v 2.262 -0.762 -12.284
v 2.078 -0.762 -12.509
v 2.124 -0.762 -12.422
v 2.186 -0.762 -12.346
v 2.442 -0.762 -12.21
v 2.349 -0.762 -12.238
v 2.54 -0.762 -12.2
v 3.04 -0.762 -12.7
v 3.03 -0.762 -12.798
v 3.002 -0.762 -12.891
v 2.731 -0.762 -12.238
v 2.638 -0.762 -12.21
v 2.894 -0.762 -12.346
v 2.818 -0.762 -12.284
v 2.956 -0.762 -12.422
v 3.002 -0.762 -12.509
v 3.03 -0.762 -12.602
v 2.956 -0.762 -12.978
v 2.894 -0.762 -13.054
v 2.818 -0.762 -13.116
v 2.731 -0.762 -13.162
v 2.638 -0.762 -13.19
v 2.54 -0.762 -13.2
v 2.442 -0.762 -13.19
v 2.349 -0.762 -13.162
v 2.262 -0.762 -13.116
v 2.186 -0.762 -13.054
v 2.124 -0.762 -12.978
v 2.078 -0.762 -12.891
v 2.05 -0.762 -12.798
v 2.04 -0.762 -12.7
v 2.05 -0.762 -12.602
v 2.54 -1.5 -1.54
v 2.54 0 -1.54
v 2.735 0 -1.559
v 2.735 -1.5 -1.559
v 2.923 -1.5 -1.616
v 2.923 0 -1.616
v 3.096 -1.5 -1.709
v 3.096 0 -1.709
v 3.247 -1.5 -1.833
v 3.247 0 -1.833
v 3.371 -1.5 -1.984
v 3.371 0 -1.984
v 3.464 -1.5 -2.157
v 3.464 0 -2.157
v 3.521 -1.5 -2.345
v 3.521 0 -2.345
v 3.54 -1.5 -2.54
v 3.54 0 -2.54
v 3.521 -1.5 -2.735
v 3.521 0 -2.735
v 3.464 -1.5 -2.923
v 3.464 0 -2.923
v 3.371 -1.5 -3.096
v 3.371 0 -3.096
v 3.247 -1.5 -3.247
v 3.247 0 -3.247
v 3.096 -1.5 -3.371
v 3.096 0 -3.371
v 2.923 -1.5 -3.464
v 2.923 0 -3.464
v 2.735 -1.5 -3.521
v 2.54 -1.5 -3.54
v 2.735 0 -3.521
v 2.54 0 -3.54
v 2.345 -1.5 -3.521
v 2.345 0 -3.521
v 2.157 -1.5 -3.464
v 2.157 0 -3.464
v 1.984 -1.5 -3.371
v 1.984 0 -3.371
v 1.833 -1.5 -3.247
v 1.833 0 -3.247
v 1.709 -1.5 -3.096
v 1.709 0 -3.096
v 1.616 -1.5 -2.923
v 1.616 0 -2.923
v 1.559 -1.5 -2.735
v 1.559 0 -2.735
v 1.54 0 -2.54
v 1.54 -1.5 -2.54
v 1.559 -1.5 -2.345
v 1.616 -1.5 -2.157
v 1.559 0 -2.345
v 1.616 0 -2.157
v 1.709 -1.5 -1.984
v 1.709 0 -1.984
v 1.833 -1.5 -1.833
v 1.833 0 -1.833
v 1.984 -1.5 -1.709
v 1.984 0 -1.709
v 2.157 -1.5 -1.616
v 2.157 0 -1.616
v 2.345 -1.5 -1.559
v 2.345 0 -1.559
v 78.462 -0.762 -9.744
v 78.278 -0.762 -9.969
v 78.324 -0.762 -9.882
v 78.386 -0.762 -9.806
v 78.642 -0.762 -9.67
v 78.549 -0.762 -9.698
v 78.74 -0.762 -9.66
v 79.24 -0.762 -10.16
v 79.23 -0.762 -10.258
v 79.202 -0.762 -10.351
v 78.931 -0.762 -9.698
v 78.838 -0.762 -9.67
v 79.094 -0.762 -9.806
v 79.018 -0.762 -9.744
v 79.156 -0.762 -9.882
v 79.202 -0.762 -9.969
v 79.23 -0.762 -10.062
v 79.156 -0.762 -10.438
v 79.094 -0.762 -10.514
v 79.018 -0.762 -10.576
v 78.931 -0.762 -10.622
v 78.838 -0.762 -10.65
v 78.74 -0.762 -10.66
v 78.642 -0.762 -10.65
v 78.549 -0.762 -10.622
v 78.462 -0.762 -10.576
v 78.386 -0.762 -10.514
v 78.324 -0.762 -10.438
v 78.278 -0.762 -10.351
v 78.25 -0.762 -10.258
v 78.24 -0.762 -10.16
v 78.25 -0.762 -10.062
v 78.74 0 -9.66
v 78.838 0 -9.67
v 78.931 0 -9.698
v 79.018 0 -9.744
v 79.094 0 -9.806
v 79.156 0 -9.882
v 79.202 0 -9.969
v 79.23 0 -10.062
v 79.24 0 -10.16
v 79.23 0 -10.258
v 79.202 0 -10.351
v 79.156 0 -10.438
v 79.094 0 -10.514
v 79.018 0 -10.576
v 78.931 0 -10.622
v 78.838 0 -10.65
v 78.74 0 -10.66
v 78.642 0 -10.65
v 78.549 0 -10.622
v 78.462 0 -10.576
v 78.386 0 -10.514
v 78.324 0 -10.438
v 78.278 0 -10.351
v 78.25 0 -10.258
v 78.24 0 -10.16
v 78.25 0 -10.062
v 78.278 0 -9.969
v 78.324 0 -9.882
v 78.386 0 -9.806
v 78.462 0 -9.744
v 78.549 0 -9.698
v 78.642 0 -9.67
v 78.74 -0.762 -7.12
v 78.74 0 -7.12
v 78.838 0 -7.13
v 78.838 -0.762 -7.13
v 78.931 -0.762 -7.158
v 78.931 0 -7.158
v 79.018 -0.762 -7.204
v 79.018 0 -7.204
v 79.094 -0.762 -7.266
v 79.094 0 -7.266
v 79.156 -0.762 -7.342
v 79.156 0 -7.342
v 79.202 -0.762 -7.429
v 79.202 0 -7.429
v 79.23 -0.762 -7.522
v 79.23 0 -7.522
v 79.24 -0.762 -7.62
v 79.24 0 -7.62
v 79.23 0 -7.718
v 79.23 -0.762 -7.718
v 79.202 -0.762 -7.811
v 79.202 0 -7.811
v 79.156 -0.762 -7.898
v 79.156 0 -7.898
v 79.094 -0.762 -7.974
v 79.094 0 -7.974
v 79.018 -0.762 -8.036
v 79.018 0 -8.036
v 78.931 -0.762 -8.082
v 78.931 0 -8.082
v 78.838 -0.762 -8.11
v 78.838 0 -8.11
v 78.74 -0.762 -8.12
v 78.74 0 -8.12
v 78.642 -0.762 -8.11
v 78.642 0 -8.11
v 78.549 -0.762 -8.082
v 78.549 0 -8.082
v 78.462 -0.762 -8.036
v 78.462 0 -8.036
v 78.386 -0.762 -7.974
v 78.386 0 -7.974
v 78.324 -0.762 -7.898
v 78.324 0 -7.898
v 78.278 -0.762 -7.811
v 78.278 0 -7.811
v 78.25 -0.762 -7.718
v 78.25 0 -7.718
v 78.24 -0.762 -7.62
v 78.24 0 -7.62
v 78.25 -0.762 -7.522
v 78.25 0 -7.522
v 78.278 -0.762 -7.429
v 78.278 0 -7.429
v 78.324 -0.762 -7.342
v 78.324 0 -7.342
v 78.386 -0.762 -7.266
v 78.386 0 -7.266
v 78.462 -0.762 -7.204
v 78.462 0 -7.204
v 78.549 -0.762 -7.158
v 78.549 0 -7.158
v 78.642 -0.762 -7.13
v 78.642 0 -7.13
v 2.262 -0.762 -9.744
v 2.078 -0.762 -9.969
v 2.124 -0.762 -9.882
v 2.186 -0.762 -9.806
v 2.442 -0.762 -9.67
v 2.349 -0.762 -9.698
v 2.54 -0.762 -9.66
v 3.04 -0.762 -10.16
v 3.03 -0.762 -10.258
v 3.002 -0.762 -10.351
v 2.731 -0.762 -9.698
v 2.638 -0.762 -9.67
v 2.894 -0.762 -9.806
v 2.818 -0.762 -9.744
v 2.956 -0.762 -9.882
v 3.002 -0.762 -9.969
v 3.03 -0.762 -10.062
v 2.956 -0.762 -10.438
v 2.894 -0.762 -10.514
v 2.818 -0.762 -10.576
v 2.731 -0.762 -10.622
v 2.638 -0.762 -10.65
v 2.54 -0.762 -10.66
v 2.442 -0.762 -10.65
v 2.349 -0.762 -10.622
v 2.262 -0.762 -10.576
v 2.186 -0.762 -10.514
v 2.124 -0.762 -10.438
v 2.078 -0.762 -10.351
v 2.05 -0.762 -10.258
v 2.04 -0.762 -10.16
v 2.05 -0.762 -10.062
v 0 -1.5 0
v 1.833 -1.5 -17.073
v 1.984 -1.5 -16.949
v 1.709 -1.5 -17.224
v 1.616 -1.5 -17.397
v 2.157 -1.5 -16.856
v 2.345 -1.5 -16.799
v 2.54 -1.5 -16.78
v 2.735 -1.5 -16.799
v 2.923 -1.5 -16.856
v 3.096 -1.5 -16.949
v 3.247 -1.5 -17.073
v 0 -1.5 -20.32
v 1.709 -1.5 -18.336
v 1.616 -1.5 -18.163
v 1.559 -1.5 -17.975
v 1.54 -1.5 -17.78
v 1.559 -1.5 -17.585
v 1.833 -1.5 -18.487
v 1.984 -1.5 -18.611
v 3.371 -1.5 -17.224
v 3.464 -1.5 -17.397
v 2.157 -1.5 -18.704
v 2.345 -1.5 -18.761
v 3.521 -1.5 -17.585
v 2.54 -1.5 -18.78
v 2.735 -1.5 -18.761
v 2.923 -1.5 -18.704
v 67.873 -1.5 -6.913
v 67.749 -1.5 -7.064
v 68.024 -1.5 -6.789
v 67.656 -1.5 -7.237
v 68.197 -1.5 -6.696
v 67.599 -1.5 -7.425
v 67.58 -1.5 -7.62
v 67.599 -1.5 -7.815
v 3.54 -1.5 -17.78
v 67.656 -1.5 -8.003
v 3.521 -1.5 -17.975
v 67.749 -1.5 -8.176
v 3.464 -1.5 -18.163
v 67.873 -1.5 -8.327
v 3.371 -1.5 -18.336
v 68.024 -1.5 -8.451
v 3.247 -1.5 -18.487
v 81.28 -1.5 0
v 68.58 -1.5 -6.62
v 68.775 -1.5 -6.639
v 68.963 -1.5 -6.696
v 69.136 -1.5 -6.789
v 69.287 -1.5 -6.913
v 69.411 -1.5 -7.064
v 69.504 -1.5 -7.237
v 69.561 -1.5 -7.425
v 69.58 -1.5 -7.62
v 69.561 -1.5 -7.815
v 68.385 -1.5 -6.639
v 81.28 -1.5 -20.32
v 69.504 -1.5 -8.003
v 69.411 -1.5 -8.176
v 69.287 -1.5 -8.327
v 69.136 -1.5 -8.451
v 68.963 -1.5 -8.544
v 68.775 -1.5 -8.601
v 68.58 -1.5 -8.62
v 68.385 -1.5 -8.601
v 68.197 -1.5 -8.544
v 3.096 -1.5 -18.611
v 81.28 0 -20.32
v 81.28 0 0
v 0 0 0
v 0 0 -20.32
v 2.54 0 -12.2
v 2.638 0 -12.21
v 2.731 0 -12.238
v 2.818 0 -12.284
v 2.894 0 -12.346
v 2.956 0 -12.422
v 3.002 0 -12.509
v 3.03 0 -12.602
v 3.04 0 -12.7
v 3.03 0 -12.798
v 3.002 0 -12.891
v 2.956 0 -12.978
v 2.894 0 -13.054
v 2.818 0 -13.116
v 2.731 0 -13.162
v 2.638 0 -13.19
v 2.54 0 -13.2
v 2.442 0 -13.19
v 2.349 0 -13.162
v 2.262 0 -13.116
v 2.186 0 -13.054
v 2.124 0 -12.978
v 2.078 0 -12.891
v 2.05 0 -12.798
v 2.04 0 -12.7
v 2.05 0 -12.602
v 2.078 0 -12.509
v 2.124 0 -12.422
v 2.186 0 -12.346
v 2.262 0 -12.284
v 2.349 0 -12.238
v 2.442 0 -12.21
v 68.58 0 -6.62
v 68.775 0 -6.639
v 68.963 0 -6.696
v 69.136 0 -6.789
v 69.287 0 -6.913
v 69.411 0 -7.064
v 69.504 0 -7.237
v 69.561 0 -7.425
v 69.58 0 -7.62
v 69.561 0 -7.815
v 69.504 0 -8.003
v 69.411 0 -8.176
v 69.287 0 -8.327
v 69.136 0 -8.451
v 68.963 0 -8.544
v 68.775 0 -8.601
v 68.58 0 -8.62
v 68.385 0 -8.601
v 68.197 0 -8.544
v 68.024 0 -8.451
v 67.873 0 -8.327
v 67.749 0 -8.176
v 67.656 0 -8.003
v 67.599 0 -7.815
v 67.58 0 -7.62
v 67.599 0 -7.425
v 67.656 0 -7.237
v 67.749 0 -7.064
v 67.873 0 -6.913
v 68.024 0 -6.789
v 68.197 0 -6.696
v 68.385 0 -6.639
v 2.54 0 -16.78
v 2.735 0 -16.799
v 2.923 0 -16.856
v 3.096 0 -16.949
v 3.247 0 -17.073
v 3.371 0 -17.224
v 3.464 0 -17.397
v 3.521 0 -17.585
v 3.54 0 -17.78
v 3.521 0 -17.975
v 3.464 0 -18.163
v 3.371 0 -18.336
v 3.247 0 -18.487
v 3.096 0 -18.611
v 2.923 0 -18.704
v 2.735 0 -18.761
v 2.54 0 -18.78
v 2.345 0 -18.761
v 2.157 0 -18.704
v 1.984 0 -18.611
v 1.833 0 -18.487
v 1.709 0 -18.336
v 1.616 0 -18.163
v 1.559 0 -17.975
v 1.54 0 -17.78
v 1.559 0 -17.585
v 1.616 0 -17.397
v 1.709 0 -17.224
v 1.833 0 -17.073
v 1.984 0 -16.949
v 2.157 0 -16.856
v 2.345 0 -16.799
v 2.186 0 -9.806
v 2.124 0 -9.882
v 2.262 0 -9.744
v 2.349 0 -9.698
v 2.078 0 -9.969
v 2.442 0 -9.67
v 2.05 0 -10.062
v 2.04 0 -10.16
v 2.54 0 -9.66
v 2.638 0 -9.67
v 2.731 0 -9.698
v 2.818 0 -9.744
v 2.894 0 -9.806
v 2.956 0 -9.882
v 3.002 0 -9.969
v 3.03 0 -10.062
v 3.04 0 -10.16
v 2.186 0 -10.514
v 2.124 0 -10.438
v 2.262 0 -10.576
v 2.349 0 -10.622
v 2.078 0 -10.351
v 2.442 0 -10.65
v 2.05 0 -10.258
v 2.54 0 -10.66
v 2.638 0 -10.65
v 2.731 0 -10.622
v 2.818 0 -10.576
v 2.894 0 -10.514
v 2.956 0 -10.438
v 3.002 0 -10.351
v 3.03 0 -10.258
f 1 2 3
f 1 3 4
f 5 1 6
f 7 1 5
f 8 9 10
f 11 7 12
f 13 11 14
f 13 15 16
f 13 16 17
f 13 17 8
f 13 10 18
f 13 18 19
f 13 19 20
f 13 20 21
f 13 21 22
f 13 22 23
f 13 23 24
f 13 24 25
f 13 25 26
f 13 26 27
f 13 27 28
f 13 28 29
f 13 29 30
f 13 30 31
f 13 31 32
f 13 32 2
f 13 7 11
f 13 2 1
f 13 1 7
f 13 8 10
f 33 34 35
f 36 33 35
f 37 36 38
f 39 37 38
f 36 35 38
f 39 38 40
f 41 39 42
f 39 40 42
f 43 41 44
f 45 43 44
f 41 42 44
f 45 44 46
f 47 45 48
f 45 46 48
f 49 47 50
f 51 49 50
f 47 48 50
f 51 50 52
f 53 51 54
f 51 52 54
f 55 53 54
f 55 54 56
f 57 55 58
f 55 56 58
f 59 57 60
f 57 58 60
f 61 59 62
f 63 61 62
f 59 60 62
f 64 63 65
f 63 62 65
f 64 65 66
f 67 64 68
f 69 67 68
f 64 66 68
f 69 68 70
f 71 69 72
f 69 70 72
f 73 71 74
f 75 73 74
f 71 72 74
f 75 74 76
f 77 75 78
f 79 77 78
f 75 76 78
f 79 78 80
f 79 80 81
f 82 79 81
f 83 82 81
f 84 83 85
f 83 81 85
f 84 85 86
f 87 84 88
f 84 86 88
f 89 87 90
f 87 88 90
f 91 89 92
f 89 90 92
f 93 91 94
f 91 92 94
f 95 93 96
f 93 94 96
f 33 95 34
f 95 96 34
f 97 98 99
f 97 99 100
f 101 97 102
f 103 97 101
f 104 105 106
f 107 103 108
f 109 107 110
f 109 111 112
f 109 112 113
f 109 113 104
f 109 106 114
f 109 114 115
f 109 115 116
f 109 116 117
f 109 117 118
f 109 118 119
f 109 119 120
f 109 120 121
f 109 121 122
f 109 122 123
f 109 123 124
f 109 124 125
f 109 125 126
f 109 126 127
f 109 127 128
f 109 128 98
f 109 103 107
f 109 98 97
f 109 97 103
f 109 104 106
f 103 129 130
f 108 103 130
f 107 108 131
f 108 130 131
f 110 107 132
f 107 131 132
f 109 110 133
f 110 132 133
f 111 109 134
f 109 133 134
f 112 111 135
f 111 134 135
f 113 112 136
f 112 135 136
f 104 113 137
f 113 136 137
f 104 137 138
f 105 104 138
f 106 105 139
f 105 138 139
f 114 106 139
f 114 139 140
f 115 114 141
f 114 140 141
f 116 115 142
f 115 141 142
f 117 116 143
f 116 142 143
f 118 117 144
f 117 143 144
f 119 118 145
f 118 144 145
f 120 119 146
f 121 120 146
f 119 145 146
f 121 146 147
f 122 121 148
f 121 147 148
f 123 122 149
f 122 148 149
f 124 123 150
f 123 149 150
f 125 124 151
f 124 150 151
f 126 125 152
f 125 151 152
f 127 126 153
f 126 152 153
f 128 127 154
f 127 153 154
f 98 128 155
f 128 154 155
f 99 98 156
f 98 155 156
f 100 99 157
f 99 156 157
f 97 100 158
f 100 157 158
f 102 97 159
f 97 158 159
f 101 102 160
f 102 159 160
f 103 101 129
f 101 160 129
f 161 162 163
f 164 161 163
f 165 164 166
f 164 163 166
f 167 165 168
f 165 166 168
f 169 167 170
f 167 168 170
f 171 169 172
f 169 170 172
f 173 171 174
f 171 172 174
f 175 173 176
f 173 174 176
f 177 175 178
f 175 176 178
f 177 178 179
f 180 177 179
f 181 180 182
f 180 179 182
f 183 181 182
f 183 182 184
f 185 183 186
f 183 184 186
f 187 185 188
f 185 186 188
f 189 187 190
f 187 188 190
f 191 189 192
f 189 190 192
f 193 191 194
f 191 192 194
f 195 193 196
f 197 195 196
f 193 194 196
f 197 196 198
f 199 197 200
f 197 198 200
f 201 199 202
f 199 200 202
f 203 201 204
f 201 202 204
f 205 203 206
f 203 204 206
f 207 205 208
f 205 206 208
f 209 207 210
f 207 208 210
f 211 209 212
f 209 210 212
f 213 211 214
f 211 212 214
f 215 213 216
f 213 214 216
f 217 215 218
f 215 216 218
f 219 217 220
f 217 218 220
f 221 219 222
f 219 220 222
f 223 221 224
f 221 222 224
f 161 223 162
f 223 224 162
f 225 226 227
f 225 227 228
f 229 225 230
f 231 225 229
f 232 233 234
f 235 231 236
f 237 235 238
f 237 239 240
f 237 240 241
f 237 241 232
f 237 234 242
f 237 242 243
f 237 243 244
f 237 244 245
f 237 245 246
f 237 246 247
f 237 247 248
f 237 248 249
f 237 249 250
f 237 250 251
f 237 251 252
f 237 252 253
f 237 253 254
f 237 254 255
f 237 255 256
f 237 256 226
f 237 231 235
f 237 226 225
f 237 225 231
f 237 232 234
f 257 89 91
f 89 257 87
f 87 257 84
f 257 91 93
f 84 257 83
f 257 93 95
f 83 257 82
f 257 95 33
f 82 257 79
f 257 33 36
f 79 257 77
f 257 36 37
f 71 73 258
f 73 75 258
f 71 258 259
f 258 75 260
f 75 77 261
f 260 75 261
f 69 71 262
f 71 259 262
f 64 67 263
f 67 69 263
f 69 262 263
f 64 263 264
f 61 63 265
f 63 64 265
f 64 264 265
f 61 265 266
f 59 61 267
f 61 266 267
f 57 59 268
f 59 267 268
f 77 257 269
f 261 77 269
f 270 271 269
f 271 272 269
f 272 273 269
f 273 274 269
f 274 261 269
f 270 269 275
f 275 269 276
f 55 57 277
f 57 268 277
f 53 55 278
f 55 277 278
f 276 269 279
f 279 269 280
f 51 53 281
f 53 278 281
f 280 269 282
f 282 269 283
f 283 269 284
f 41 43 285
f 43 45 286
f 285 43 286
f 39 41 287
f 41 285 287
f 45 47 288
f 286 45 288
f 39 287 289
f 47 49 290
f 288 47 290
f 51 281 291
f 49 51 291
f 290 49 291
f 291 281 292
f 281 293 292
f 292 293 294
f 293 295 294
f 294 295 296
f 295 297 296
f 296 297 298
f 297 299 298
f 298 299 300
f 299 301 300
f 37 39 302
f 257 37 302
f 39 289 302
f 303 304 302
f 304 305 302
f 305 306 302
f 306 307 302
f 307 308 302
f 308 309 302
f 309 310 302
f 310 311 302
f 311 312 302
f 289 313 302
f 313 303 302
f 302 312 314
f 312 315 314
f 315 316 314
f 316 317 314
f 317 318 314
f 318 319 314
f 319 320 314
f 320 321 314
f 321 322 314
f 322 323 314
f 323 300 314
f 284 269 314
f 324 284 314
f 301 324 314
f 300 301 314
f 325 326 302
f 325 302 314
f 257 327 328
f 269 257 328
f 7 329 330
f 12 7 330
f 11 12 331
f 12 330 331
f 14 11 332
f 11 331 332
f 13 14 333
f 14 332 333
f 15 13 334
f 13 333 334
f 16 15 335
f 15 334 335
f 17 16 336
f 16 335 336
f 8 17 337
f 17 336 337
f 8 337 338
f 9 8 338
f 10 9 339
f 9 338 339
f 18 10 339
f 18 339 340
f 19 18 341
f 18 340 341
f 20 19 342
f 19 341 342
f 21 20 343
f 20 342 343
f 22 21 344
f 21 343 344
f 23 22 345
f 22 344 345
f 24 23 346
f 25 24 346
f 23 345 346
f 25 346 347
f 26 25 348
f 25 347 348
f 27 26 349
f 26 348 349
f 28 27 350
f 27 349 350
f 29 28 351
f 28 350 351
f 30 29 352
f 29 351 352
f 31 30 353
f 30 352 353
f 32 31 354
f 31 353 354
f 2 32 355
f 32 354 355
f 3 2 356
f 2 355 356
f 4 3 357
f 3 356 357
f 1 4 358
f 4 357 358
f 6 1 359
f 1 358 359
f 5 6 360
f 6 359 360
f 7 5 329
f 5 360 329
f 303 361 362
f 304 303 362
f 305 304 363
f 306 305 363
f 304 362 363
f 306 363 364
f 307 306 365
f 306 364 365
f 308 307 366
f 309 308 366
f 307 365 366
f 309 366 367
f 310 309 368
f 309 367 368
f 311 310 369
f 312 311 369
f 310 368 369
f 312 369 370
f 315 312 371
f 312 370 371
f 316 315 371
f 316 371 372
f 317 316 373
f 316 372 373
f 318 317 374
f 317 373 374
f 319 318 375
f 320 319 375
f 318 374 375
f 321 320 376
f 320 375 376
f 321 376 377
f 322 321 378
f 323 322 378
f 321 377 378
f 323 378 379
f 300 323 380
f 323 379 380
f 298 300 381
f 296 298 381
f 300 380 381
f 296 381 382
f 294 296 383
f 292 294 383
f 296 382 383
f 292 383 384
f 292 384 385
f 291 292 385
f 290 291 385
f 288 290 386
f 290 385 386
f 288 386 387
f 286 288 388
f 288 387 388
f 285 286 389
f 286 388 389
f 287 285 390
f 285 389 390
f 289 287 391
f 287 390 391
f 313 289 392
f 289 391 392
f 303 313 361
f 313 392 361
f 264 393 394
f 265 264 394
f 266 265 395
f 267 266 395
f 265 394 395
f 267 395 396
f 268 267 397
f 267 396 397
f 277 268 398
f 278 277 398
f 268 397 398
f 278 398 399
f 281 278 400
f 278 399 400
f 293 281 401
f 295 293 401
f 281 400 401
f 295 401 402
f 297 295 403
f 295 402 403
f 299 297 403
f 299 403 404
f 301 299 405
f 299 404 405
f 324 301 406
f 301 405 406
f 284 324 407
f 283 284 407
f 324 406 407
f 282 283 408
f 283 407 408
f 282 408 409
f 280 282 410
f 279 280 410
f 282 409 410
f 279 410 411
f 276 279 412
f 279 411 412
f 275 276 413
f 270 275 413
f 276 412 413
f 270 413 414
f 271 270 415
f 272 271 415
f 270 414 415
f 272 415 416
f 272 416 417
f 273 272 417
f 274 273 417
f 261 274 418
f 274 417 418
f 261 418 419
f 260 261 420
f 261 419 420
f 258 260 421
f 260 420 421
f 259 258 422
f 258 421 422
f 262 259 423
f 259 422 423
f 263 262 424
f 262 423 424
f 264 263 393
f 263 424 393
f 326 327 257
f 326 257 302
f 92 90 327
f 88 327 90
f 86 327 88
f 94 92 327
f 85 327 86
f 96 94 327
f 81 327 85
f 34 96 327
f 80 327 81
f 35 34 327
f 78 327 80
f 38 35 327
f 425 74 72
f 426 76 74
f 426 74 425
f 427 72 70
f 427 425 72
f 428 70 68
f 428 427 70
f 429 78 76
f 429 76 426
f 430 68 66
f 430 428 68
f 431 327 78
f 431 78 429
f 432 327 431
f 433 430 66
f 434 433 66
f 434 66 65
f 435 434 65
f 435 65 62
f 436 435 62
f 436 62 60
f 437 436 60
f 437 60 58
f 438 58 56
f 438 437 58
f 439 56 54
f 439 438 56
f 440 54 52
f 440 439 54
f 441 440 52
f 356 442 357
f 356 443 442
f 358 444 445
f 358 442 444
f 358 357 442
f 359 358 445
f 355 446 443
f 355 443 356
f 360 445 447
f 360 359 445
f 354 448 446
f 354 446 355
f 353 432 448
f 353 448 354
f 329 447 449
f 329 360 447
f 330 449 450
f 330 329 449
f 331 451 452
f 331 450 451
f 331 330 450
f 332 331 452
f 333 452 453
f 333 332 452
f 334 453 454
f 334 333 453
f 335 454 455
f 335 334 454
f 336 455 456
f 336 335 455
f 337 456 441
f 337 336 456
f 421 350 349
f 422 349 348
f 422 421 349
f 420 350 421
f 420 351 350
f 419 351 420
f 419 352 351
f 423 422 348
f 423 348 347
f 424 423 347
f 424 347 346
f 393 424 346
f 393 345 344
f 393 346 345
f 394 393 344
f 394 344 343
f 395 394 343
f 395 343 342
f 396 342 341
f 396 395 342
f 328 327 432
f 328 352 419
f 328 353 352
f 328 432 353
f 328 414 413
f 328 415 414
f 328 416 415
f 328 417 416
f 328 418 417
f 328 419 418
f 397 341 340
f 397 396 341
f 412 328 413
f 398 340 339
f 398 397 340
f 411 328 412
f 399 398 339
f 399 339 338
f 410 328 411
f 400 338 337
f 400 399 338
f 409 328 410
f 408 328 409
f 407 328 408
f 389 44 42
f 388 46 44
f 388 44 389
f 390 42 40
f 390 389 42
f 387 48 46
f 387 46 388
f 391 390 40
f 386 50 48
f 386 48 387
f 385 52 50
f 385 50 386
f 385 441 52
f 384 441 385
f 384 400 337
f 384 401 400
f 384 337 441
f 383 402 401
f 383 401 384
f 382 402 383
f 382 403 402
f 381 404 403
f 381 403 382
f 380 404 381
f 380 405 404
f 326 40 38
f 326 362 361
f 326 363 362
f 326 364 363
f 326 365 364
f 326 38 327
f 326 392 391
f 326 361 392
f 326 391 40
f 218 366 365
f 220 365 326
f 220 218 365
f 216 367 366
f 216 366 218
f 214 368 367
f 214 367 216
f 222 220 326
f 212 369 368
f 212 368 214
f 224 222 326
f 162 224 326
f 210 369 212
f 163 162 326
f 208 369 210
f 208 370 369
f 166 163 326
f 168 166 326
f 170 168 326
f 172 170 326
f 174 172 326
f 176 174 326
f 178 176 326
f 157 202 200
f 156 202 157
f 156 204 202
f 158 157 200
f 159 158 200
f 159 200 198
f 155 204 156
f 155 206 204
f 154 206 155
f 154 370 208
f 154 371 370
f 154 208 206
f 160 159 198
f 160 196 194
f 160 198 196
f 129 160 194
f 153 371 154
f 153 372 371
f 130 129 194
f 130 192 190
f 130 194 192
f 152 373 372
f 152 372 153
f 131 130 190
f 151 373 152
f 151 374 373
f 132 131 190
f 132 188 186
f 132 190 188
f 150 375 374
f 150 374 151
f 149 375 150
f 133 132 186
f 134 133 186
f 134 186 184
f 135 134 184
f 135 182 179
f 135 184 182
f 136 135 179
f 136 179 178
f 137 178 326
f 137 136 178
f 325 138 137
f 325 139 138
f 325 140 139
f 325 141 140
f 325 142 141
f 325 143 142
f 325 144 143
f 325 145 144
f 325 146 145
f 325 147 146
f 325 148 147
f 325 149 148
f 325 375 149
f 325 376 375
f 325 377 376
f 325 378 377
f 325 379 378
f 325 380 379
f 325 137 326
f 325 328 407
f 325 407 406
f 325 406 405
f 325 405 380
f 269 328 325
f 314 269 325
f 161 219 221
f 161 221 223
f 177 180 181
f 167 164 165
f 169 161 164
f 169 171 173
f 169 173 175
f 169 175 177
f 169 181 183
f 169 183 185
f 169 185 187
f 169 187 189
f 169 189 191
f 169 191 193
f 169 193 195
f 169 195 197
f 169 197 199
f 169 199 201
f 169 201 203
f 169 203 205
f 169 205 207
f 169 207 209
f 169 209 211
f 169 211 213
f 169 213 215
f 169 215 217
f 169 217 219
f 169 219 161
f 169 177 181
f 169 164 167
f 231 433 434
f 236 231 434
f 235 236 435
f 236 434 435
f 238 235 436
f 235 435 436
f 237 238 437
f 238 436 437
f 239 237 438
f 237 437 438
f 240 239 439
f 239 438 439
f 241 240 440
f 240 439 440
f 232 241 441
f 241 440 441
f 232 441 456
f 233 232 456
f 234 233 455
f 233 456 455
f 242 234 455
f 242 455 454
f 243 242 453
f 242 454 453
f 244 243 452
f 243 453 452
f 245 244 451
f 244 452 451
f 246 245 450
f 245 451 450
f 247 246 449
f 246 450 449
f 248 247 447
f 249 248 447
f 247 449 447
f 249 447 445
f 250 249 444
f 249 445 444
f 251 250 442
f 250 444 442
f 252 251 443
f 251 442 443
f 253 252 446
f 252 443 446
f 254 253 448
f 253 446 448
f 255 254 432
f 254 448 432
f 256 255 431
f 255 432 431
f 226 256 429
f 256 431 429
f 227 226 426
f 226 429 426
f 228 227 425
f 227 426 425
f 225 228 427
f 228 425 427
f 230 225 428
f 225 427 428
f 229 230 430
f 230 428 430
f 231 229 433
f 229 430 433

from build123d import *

# Parameters (mm, degrees)
SKETCH1_W           = 81.28
SKETCH1_H           = 20.32
SKETCH1_R           = 1
BOSS_EXTRUDE1_DEPTH = 1.5
SKETCH1_3_R         = 0.5
CUT_EXTRUDE1_DEPTH  = 0.762


with BuildPart() as part:
    # Sketch1 → Boss-Extrude1 (new body)
    with BuildSketch(Plane(origin=(0, 0, 0), x_dir=(1, 0, 0), z_dir=(0, 1, 0))):
        with Locations((40.64, 10.16)):
            Rectangle(SKETCH1_W, SKETCH1_H)
        with Locations(Location((2.54, 2.54, 0), (0, 0, 270))):  # turned: the seam where the file's is
            Circle(SKETCH1_R, mode=Mode.SUBTRACT)
        with Locations(Location((68.58, 7.62, 0), (0, 0, 270))):  # turned: the seam where the file's is
            Circle(SKETCH1_R, mode=Mode.SUBTRACT)
        with Locations(Location((2.54, 17.78, 0), (0, 0, 270))):  # turned: the seam where the file's is
            Circle(SKETCH1_R, mode=Mode.SUBTRACT)
    extrude(amount=-BOSS_EXTRUDE1_DEPTH)

    # Sketch1_3 → Cut-Extrude1 (cut)
    with BuildSketch(Plane(origin=(0, 0, 0), x_dir=(1, 0, 0), z_dir=(0, 1, 0))):
        with Locations(Location((2.54, 12.7, 0), (0, 0, 270))):  # turned: the seam where the file's is
            Circle(SKETCH1_3_R)
        with Locations(Location((2.54, 10.16, 0), (0, 0, 270))):  # turned: the seam where the file's is
            Circle(SKETCH1_3_R)
        with Locations(Location((78.74, 7.62, 0), (0, 0, 270))):  # turned: the seam where the file's is
            Circle(SKETCH1_3_R)
        with Locations(Location((78.74, 10.16, 0), (0, 0, 270))):  # turned: the seam where the file's is
            Circle(SKETCH1_3_R)
    extrude(amount=-CUT_EXTRUDE1_DEPTH, mode=Mode.SUBTRACT)


solid = part.part
